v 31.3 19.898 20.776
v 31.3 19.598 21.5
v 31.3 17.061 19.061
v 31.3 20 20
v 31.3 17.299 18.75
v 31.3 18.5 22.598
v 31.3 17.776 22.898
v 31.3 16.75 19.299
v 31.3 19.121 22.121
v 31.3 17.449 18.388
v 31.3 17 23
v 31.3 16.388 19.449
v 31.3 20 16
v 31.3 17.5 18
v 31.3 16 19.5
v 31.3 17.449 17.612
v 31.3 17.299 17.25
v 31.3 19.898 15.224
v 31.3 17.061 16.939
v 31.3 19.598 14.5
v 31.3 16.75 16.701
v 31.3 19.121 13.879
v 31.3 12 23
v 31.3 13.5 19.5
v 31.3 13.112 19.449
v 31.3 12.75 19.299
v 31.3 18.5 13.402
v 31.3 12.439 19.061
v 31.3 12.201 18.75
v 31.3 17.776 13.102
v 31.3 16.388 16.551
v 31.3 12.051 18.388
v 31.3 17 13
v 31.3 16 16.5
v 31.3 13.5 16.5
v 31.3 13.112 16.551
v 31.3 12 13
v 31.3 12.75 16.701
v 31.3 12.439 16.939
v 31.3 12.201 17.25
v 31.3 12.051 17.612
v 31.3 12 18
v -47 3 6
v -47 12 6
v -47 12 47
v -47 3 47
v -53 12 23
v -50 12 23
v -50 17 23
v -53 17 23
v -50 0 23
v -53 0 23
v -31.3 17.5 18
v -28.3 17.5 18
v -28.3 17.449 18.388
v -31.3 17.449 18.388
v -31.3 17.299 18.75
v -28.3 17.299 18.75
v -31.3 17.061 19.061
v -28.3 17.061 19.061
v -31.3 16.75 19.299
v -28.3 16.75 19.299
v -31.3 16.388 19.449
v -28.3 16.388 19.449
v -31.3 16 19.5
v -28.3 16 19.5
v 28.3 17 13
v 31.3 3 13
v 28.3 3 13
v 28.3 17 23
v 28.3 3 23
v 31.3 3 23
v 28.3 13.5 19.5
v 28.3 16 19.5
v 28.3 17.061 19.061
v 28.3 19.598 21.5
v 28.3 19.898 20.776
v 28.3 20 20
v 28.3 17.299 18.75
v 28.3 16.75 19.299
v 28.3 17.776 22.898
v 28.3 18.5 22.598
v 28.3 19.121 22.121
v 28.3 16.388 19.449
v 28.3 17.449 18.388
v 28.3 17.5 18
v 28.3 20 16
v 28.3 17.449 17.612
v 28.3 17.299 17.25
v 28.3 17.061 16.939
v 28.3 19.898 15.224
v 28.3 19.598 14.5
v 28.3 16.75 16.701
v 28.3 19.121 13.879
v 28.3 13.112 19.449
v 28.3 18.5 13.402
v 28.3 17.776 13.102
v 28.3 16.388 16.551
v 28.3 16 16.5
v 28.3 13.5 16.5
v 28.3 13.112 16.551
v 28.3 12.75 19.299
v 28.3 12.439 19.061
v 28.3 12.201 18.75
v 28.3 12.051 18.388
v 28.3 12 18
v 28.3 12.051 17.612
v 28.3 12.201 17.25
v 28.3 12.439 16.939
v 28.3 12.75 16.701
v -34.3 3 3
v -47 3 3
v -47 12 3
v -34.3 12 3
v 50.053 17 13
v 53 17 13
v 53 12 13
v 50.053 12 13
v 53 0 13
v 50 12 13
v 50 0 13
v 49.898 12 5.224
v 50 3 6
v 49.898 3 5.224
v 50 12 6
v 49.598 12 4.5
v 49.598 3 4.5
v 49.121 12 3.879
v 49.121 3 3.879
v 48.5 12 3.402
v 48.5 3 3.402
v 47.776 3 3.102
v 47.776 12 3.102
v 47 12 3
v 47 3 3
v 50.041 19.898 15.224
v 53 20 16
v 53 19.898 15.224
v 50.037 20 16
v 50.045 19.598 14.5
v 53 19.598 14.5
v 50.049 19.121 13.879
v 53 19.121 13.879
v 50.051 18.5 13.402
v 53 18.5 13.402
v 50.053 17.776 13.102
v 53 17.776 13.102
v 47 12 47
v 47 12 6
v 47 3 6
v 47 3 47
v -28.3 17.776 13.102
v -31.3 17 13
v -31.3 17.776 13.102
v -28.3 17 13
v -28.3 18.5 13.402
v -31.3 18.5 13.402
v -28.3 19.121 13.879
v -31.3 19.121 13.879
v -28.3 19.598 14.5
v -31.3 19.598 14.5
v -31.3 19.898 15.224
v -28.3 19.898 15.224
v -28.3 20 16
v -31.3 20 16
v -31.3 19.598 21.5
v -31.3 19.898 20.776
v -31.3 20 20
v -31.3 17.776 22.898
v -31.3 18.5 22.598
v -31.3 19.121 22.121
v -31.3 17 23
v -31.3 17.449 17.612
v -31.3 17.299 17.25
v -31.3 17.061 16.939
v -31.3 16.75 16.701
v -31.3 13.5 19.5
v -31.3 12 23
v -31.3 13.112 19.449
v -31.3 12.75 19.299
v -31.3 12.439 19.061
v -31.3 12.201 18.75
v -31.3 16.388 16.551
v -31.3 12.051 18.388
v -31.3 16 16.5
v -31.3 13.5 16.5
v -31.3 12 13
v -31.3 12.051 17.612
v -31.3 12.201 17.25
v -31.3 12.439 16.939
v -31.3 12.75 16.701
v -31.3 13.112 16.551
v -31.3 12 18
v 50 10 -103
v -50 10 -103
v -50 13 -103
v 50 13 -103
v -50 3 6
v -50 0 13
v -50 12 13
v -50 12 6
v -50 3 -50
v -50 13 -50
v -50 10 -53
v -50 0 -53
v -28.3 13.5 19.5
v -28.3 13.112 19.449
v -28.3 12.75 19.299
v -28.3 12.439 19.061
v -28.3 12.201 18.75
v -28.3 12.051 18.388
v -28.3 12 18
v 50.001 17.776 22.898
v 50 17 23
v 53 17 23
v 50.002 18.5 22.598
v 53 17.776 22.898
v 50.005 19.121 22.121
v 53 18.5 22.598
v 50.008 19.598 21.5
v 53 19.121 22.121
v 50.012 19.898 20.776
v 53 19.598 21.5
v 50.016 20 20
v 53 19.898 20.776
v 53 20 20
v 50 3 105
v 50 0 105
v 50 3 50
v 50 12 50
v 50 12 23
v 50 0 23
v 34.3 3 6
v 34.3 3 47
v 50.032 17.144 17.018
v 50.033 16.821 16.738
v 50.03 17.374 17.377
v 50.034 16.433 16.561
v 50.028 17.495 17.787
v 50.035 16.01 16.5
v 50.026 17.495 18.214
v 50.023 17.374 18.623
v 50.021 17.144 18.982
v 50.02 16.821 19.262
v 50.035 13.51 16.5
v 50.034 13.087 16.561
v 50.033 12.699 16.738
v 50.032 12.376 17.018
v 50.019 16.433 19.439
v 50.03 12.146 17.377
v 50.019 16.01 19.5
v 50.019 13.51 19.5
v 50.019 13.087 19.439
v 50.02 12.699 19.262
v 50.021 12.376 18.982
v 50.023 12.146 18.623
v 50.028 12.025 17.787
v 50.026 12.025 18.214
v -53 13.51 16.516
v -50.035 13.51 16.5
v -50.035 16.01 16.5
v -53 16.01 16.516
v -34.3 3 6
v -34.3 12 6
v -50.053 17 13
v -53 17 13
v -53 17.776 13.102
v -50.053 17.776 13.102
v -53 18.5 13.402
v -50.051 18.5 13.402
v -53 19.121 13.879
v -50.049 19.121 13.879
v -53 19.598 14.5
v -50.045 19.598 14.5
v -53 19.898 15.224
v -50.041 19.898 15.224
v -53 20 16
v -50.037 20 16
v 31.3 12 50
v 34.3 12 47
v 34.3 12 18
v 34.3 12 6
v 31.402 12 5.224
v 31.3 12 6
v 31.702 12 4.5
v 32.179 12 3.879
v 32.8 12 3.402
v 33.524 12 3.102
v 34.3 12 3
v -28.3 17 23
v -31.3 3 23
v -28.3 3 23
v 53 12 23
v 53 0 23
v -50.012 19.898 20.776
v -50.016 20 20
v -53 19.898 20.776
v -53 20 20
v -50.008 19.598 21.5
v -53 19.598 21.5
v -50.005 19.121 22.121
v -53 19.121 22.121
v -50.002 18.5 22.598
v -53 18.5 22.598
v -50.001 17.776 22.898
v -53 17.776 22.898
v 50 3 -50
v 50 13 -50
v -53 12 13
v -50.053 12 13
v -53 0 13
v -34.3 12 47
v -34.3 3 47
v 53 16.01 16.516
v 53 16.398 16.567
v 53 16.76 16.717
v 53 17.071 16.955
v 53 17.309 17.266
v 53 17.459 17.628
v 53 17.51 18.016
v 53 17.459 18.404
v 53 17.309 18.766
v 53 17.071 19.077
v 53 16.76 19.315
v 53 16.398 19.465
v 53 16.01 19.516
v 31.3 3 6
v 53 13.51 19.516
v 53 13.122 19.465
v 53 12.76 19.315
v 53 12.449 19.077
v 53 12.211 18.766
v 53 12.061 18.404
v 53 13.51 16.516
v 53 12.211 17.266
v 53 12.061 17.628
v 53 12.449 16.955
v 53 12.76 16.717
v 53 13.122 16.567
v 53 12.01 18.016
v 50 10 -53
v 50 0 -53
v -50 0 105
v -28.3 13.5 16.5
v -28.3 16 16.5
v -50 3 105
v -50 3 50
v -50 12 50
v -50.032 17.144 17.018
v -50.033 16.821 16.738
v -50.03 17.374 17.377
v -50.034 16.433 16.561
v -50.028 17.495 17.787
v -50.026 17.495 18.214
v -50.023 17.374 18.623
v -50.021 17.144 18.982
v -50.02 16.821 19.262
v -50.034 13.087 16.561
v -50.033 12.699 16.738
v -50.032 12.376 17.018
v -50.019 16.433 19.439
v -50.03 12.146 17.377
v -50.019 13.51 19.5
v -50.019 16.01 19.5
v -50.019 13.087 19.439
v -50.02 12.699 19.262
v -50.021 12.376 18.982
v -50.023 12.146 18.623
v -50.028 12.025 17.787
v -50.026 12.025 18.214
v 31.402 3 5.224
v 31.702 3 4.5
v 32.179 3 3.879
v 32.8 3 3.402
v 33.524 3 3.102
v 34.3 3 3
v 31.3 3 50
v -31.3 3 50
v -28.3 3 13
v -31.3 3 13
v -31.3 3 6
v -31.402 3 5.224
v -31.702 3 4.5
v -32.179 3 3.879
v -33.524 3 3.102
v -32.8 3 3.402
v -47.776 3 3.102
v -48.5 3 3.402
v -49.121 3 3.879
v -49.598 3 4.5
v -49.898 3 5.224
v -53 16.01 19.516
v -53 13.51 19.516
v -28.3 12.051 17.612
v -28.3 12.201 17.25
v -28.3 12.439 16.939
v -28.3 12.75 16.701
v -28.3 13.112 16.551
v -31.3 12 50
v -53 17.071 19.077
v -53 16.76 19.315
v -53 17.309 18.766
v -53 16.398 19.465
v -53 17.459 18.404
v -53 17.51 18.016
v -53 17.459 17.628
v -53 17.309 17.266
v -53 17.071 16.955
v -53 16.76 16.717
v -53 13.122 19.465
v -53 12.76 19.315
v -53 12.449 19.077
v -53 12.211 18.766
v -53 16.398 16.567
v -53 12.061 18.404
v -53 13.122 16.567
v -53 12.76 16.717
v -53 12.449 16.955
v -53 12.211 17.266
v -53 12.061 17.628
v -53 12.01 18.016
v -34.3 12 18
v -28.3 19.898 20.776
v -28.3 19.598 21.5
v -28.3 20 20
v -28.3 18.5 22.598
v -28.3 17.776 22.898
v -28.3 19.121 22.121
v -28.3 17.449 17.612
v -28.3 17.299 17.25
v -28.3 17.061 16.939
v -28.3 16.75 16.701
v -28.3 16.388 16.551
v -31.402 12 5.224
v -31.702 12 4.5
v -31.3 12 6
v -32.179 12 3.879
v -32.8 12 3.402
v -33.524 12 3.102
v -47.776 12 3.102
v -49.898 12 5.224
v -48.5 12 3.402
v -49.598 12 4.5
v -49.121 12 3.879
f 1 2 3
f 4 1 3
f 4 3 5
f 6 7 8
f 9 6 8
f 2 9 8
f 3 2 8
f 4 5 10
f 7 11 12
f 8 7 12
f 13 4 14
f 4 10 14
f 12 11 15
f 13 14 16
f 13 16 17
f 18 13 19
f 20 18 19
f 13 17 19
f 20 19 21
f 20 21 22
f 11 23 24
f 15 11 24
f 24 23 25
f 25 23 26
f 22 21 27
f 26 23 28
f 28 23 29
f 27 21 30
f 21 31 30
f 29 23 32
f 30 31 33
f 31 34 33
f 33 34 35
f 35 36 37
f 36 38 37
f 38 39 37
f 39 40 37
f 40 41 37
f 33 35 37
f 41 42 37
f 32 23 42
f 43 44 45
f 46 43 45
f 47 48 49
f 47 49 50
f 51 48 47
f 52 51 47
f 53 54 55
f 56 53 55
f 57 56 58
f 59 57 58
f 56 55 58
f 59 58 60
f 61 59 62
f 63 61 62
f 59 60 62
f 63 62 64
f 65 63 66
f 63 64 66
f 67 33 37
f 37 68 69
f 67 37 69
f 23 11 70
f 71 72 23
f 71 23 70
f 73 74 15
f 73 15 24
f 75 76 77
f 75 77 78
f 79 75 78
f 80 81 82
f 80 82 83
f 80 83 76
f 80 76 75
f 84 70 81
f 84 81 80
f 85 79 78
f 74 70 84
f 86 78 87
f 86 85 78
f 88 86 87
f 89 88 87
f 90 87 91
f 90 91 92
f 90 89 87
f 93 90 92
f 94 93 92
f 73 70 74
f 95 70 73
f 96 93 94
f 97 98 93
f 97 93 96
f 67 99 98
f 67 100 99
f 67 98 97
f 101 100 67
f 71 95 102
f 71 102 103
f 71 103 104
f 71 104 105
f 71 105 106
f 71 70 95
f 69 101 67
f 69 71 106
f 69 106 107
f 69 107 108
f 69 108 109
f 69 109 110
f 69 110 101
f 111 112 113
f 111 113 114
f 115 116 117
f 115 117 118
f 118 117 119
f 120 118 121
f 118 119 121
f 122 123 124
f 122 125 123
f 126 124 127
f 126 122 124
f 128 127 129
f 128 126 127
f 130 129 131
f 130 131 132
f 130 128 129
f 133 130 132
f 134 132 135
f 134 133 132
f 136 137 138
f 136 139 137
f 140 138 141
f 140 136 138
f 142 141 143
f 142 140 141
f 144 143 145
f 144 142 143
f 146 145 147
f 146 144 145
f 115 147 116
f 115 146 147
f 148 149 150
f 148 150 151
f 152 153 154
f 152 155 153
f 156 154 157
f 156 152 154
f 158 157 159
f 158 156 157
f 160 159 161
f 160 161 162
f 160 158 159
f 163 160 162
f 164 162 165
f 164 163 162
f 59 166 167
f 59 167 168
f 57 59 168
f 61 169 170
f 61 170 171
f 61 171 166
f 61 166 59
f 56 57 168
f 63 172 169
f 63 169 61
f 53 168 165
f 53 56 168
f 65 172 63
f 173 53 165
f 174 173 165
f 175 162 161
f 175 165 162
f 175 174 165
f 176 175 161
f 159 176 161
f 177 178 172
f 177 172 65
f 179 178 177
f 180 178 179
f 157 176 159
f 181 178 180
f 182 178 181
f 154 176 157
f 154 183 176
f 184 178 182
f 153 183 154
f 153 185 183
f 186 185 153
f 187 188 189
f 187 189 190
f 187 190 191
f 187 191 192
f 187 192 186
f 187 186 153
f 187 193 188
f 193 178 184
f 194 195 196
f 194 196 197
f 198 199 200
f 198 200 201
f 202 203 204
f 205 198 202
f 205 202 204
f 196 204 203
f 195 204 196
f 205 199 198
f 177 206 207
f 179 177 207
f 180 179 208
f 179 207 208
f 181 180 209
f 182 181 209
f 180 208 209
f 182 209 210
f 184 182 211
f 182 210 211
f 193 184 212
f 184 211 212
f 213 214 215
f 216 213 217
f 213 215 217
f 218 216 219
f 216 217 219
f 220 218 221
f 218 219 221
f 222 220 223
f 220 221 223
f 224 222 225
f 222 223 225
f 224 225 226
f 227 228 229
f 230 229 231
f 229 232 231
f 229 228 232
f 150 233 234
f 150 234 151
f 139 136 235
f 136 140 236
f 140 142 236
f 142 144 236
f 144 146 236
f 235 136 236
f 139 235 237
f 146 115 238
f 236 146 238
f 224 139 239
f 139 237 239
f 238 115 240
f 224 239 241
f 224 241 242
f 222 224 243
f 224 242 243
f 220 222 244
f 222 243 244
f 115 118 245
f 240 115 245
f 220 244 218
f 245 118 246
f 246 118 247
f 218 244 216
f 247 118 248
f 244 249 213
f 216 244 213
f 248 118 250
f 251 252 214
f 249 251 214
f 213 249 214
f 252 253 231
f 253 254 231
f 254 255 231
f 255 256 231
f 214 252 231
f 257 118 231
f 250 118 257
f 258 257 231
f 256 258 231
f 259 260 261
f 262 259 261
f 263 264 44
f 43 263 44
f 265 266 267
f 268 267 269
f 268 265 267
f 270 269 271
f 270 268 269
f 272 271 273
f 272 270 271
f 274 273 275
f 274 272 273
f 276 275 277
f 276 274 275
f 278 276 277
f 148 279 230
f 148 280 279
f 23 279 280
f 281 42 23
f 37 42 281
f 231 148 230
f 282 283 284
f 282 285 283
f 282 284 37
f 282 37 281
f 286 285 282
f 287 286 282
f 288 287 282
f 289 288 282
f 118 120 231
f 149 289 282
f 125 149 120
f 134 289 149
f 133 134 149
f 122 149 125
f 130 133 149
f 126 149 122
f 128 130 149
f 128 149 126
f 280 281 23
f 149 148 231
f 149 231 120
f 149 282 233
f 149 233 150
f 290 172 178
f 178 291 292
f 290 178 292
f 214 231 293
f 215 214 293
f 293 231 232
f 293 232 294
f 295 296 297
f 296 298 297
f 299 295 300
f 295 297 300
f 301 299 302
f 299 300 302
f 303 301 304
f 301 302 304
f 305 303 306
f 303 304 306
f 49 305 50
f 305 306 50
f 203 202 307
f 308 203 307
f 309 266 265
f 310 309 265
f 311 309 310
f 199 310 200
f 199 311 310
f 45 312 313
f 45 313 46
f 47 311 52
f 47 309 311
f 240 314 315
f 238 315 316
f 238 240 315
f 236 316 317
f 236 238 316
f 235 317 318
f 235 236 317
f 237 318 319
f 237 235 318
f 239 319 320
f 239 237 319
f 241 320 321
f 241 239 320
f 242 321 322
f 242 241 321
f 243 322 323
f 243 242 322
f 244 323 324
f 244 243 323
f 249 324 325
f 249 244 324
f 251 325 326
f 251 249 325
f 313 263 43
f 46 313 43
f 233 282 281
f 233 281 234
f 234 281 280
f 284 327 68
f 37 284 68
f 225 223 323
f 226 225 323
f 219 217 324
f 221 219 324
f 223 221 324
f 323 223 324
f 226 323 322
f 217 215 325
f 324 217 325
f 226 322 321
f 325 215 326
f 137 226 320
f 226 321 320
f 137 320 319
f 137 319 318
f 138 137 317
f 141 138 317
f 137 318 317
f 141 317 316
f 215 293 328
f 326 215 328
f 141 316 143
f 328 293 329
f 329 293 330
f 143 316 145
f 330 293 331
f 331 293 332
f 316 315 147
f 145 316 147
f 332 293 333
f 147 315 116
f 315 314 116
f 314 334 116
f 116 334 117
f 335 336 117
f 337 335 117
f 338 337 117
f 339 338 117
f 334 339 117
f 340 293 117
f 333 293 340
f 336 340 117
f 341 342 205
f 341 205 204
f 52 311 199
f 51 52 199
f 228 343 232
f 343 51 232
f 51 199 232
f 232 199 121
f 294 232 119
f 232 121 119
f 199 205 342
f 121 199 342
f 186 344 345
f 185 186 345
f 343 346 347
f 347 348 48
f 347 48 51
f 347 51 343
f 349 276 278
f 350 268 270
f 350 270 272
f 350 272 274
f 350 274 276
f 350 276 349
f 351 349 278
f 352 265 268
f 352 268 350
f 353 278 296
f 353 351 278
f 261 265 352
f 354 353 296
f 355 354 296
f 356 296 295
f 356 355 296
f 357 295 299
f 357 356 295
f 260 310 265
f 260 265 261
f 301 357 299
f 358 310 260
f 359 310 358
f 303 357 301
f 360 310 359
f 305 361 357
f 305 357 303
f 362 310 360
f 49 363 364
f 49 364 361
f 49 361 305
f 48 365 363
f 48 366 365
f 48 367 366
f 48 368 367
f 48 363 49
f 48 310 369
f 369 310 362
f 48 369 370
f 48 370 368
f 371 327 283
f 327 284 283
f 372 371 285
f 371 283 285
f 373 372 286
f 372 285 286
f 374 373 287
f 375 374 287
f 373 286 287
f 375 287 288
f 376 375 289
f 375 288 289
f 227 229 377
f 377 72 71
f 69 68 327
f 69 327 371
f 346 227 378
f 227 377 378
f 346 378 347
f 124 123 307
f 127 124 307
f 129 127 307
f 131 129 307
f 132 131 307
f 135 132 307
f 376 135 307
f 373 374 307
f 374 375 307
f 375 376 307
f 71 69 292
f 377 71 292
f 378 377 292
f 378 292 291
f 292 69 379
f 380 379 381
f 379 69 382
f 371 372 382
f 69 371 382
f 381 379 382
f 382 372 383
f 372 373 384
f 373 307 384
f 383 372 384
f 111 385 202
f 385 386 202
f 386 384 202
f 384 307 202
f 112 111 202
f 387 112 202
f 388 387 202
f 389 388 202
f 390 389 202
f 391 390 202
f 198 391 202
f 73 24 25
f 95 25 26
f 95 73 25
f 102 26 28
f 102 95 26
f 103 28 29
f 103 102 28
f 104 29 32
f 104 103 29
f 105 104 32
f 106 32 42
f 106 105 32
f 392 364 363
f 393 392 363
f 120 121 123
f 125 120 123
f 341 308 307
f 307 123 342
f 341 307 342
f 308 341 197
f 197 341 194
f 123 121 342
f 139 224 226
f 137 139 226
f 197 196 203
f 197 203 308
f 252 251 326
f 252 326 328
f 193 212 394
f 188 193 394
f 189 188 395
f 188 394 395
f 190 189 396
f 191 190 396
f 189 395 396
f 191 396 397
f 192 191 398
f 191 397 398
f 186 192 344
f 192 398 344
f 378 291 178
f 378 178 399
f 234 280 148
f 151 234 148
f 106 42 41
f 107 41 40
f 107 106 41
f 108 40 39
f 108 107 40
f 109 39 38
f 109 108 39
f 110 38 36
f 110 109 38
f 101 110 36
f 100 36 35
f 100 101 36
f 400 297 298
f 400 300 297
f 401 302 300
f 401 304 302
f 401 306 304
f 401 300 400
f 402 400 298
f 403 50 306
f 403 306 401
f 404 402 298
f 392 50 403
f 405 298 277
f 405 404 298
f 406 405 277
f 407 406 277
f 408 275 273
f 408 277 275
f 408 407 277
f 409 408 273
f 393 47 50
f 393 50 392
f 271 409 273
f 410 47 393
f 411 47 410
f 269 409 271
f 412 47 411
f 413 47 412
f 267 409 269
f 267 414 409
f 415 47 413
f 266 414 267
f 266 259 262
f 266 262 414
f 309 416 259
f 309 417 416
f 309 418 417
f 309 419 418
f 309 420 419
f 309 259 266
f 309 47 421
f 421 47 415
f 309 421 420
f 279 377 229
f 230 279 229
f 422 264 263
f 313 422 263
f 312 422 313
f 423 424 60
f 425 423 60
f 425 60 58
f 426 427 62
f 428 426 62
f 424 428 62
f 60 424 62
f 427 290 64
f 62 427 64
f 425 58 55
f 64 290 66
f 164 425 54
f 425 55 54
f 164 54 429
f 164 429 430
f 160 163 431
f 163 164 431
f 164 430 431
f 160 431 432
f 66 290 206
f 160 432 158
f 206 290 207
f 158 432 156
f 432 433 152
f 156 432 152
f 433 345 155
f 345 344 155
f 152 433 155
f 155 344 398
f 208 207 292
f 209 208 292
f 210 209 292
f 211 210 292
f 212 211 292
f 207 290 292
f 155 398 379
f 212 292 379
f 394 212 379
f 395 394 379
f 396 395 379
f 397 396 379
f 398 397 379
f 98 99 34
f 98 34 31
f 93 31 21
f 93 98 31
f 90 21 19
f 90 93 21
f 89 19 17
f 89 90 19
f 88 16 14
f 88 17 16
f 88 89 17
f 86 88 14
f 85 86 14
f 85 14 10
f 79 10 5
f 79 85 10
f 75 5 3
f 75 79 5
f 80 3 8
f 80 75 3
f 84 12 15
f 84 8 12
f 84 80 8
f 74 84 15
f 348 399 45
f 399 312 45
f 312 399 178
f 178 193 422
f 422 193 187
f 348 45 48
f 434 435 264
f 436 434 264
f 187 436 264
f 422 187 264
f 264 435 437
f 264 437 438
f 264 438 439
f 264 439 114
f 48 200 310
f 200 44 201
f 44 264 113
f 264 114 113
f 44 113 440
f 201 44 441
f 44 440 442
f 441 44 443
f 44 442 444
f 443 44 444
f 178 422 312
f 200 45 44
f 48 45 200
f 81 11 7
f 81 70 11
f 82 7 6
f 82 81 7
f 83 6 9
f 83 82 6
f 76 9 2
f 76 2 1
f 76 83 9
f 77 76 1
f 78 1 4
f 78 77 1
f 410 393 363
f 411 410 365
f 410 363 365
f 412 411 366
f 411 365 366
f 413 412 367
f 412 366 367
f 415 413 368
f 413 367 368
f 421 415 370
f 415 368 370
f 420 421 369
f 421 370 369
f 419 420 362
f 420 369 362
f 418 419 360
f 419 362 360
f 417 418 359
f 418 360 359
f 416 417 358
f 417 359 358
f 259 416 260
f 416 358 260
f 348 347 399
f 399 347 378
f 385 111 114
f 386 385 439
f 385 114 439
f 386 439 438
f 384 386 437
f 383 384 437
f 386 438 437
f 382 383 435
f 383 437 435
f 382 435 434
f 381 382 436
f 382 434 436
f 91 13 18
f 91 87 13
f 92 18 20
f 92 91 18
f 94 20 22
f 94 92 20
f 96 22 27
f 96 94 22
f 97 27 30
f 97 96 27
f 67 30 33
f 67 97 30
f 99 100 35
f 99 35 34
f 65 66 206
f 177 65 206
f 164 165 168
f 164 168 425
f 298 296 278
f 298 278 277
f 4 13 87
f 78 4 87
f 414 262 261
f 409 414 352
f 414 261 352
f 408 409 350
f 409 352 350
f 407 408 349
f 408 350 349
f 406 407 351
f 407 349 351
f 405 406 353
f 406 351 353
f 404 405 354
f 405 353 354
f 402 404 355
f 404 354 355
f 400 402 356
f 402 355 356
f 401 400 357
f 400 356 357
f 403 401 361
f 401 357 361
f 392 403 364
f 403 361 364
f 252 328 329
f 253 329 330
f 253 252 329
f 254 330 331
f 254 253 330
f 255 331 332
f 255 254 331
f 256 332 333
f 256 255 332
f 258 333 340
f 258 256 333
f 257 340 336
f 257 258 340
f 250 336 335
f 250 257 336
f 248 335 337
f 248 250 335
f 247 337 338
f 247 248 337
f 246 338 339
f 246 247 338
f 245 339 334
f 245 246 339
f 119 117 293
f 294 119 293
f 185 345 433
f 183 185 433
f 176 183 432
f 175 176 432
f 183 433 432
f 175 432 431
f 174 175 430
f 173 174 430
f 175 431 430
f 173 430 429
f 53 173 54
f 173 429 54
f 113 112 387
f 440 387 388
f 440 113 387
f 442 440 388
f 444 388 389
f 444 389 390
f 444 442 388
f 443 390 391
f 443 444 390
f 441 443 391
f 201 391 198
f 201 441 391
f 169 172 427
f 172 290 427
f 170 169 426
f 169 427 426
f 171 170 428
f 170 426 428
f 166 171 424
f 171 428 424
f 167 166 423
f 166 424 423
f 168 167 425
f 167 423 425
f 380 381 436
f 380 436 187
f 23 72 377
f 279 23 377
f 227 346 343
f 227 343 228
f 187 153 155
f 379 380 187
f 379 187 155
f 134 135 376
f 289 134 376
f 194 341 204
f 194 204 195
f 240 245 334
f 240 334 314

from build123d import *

# Parameters (mm, degrees)
ESBO_O1_W                = 100
ESBO_O1_H                = 100
EXTRUS_O1_DEPTH          = 3
EXTRUS_O2_DEPTH          = 9
ESBO_O3_W                = 12.7
ESBO_O3_H                = 41
EXTRUS_O3_DEPTH          = 9
FILETE2_R                = 3
ESBO_O6_W                = 3
ESBO_O6_H                = 10
EXTRUS_O4_DEPTH          = 3
ESBO_O7_W                = 3
ESBO_O7_H                = 10
EXTRUS_O5_DEPTH          = 17
EXTRUS_O6_DEPTH          = 8
FILETE3_R                = 3
FILETE2_OF_ESPELHAR4_R   = 3
FILETE3_OF_ESPELHAR4_R   = 3
EXTRUS_O17_DEPTH         = 10
EXTRUS_O30_DEPTH         = 10
ESBO_O22_W               = 100
ESBO_O22_H               = 3
EXTRUS_O33_DEPTH         = 53
ESBO_O23_W               = 100
ESBO_O23_H               = 53
EXTRUS_O35_DEPTH         = 10
ESBO_O24_W               = 50
ESBO_O24_H               = 10
EXTRUS_O36_DEPTH         = 148.030904796
RESSALTO_EXTRUS_O1_DEPTH = 55


with BuildPart() as part:
    # Esboço1 → Extrusão1 (new body)
    with BuildSketch(Plane(origin=(0, 0, 0), x_dir=(1, 0, 0), z_dir=(0, 1, 0))):
        Rectangle(ESBO_O1_W, ESBO_O1_H)
    extrus_o1 = extrude(amount=EXTRUS_O1_DEPTH)

    # Esboço2 → Extrusão2 (add)
    with BuildSketch(Plane(origin=(0, 3, 0), x_dir=(1, 0, 0), z_dir=(0, 1, 0))):
        Polygon((-50, -3), (-31.3, -3), (-31.3, -50), (-50, -50), (-50, -23), (-53, -23), (-53, -13), (-50, -13), align=None)
    extrus_o2 = extrude(amount=EXTRUS_O2_DEPTH)

    # Esboço3 → Extrusão3 (cut)
    with BuildSketch(Plane(origin=(0, 12, 0), x_dir=(-1, 0, 0), z_dir=(0, 1, 0))):
        with Locations((40.65, 26.5)):
            Rectangle(ESBO_O3_W, ESBO_O3_H)
    extrus_o3 = extrude(amount=-EXTRUS_O3_DEPTH, mode=Mode.SUBTRACT)

    # Filete2
    filete2_edges = [part.edges().sort_by_distance(p)[0] for p in [
        (-50, 7.5, 3),
        (-31.3, 7.5, 3),
    ]]
    fillet(filete2_edges, radius=FILETE2_R)

    # Esboço6 → Extrusão4 (add)
    with BuildSketch(Plane.XZ.offset(-3)):
        with Locations((-51.5, 18)):
            Rectangle(ESBO_O6_W, ESBO_O6_H)
    extrus_o4 = extrude(amount=EXTRUS_O4_DEPTH)

    # Esboço7 → Extrusão5 (add)
    with BuildSketch(Plane(origin=(0, 3, 0), x_dir=(1, 0, 0), z_dir=(0, 1, 0))):
        with Locations((-29.8, -18)):
            Rectangle(ESBO_O7_W, ESBO_O7_H)
    extrus_o5 = extrude(amount=EXTRUS_O5_DEPTH)

    # Esboço8 → Extrusão6 (add)
    with BuildSketch(Plane(origin=(0, 12, 0), x_dir=(1, 0, 0), z_dir=(0, 1, 0))):
        Polygon((-53.00042216, -13), (-50.053356487, -13), (-50, -23), (-53, -23), align=None)
    extrus_o6 = extrude(amount=EXTRUS_O6_DEPTH)

    # Filete3
    filete3_edges = [part.edges().sort_by_distance(p)[0] for p in [
        (-51.5, 20, 23),
        (-51.526889323, 20, 13),
        (-29.8, 20, 23),
        (-29.8, 20, 13),
    ]]
    fillet(filete3_edges, radius=FILETE3_R)

    # Espelhar4: Extrusão1, Extrusão2, Extrusão3, Extrusão4, Extrusão5, Extrusão6 across plane
    add(extrus_o1.mirror(Plane(origin=(0, 0, 0), x_dir=(0, 0, 1), z_dir=(1, 0, 0))))
    add(extrus_o2.mirror(Plane(origin=(0, 0, 0), x_dir=(0, 0, 1), z_dir=(1, 0, 0))))
    add(extrus_o3.mirror(Plane(origin=(0, 0, 0), x_dir=(0, 0, 1), z_dir=(1, 0, 0))), mode=Mode.SUBTRACT)
    add(extrus_o4.mirror(Plane(origin=(0, 0, 0), x_dir=(0, 0, 1), z_dir=(1, 0, 0))))
    add(extrus_o5.mirror(Plane(origin=(0, 0, 0), x_dir=(0, 0, 1), z_dir=(1, 0, 0))))
    add(extrus_o6.mirror(Plane(origin=(0, 0, 0), x_dir=(0, 0, 1), z_dir=(1, 0, 0))))

    # Filete2 of Espelhar4
    filete2_of_espelhar4_edges = [part.edges().sort_by_distance(p)[0] for p in [
        (50, 7.5, 3),
        (31.3, 7.5, 3),
    ]]
    fillet(filete2_of_espelhar4_edges, radius=FILETE2_OF_ESPELHAR4_R)

    # Filete3 of Espelhar4
    filete3_of_espelhar4_edges = [part.edges().sort_by_distance(p)[0] for p in [
        (51.5, 20, 23),
        (51.526889323, 20, 13),
        (29.8, 20, 23),
        (29.8, 20, 13),
    ]]
    fillet(filete3_of_espelhar4_edges, radius=FILETE3_OF_ESPELHAR4_R)

    # Esboço9 → Extrusão17 (cut)
    with BuildSketch(Plane(origin=(-28.3, 0, 0), x_dir=(0, 0, -1), z_dir=(1, 0, 0))):
        with BuildLine():
            ThreePointArc((-18, 17.5), (-19.060660172, 17.060660172), (-19.5, 16))
            Line((-19.5, 16), (-19.5, 13.5))
            ThreePointArc((-19.5, 13.5), (-19.060660172, 12.439339828), (-18, 12))
            ThreePointArc((-18, 12), (-16.939339828, 12.439339828), (-16.5, 13.5))
            Line((-16.5, 13.5), (-16.5, 16))
            ThreePointArc((-16.5, 16), (-16.939339828, 17.060660172), (-18, 17.5))
        make_face()
    extrus_o17 = extrude(amount=-EXTRUS_O17_DEPTH, mode=Mode.SUBTRACT)

    # Esboço15 → Extrusão30 (cut)
    with BuildSketch(Plane(origin=(-50.121293009, 0, 0.267429611), x_dir=(-0.005335572730928429, 0, -0.9999857657305093), z_dir=(0.9999857657305093, 0, -0.005335572730928429))):
        with BuildLine():
            Line((-19.232893975, 16.01), (-19.232893975, 13.51))
            ThreePointArc((-19.232893975, 13.51), (-17.732893975, 12.01), (-16.232893975, 13.51))
            Line((-16.232893975, 13.51), (-16.232893975, 16.01))
            ThreePointArc((-16.232893975, 16.01), (-17.732893975, 17.51), (-19.232893975, 16.01))
        make_face()
    extrus_o30 = extrude(amount=-EXTRUS_O30_DEPTH, mode=Mode.SUBTRACT)

    # Espelhar14: Extrusão17, Extrusão30 across plane
    add(extrus_o17.mirror(Plane(origin=(0, 0, 0), x_dir=(0, 0, 1), z_dir=(1, 0, 0))), mode=Mode.SUBTRACT)
    add(extrus_o30.mirror(Plane(origin=(0, 0, 0), x_dir=(0, 0, 1), z_dir=(1, 0, 0))), mode=Mode.SUBTRACT)

    # Esboço22 → Extrusão33 (add)
    with BuildSketch(Plane(origin=(0, 0, -50), x_dir=(-1, 0, 0), z_dir=(0, 0, -1))):
        with Locations((0, 1.5)):
            Rectangle(ESBO_O22_W, ESBO_O22_H)
    extrude(amount=EXTRUS_O33_DEPTH)

    # Esboço23 → Extrusão35 (add)
    with BuildSketch(Plane(origin=(0, 3, 0), x_dir=(1, 0, 0), z_dir=(0, 1, 0))):
        with Locations((0, 76.5)):
            Rectangle(ESBO_O23_W, ESBO_O23_H)
    extrude(amount=EXTRUS_O35_DEPTH)

    # Esboço24 → Extrusão36 (cut, through all)
    with BuildSketch(Plane(origin=(50, 0, 0), x_dir=(0, 0, -1), z_dir=(1, 0, 0))):
        with Locations((78, 5)):
            Rectangle(ESBO_O24_W, ESBO_O24_H)
    extrude(amount=-EXTRUS_O36_DEPTH, mode=Mode.SUBTRACT)

    # Esboço26 → Ressalto-extrusão1 (add)
    with BuildSketch(Plane.XY.offset(50)):
        Polygon((31.3, 3), (-31.3, 3), (-50, 3), (-50, 0), (50, 0), (50, 3), align=None)
    extrude(amount=RESSALTO_EXTRUS_O1_DEPTH)


solid = part.part
